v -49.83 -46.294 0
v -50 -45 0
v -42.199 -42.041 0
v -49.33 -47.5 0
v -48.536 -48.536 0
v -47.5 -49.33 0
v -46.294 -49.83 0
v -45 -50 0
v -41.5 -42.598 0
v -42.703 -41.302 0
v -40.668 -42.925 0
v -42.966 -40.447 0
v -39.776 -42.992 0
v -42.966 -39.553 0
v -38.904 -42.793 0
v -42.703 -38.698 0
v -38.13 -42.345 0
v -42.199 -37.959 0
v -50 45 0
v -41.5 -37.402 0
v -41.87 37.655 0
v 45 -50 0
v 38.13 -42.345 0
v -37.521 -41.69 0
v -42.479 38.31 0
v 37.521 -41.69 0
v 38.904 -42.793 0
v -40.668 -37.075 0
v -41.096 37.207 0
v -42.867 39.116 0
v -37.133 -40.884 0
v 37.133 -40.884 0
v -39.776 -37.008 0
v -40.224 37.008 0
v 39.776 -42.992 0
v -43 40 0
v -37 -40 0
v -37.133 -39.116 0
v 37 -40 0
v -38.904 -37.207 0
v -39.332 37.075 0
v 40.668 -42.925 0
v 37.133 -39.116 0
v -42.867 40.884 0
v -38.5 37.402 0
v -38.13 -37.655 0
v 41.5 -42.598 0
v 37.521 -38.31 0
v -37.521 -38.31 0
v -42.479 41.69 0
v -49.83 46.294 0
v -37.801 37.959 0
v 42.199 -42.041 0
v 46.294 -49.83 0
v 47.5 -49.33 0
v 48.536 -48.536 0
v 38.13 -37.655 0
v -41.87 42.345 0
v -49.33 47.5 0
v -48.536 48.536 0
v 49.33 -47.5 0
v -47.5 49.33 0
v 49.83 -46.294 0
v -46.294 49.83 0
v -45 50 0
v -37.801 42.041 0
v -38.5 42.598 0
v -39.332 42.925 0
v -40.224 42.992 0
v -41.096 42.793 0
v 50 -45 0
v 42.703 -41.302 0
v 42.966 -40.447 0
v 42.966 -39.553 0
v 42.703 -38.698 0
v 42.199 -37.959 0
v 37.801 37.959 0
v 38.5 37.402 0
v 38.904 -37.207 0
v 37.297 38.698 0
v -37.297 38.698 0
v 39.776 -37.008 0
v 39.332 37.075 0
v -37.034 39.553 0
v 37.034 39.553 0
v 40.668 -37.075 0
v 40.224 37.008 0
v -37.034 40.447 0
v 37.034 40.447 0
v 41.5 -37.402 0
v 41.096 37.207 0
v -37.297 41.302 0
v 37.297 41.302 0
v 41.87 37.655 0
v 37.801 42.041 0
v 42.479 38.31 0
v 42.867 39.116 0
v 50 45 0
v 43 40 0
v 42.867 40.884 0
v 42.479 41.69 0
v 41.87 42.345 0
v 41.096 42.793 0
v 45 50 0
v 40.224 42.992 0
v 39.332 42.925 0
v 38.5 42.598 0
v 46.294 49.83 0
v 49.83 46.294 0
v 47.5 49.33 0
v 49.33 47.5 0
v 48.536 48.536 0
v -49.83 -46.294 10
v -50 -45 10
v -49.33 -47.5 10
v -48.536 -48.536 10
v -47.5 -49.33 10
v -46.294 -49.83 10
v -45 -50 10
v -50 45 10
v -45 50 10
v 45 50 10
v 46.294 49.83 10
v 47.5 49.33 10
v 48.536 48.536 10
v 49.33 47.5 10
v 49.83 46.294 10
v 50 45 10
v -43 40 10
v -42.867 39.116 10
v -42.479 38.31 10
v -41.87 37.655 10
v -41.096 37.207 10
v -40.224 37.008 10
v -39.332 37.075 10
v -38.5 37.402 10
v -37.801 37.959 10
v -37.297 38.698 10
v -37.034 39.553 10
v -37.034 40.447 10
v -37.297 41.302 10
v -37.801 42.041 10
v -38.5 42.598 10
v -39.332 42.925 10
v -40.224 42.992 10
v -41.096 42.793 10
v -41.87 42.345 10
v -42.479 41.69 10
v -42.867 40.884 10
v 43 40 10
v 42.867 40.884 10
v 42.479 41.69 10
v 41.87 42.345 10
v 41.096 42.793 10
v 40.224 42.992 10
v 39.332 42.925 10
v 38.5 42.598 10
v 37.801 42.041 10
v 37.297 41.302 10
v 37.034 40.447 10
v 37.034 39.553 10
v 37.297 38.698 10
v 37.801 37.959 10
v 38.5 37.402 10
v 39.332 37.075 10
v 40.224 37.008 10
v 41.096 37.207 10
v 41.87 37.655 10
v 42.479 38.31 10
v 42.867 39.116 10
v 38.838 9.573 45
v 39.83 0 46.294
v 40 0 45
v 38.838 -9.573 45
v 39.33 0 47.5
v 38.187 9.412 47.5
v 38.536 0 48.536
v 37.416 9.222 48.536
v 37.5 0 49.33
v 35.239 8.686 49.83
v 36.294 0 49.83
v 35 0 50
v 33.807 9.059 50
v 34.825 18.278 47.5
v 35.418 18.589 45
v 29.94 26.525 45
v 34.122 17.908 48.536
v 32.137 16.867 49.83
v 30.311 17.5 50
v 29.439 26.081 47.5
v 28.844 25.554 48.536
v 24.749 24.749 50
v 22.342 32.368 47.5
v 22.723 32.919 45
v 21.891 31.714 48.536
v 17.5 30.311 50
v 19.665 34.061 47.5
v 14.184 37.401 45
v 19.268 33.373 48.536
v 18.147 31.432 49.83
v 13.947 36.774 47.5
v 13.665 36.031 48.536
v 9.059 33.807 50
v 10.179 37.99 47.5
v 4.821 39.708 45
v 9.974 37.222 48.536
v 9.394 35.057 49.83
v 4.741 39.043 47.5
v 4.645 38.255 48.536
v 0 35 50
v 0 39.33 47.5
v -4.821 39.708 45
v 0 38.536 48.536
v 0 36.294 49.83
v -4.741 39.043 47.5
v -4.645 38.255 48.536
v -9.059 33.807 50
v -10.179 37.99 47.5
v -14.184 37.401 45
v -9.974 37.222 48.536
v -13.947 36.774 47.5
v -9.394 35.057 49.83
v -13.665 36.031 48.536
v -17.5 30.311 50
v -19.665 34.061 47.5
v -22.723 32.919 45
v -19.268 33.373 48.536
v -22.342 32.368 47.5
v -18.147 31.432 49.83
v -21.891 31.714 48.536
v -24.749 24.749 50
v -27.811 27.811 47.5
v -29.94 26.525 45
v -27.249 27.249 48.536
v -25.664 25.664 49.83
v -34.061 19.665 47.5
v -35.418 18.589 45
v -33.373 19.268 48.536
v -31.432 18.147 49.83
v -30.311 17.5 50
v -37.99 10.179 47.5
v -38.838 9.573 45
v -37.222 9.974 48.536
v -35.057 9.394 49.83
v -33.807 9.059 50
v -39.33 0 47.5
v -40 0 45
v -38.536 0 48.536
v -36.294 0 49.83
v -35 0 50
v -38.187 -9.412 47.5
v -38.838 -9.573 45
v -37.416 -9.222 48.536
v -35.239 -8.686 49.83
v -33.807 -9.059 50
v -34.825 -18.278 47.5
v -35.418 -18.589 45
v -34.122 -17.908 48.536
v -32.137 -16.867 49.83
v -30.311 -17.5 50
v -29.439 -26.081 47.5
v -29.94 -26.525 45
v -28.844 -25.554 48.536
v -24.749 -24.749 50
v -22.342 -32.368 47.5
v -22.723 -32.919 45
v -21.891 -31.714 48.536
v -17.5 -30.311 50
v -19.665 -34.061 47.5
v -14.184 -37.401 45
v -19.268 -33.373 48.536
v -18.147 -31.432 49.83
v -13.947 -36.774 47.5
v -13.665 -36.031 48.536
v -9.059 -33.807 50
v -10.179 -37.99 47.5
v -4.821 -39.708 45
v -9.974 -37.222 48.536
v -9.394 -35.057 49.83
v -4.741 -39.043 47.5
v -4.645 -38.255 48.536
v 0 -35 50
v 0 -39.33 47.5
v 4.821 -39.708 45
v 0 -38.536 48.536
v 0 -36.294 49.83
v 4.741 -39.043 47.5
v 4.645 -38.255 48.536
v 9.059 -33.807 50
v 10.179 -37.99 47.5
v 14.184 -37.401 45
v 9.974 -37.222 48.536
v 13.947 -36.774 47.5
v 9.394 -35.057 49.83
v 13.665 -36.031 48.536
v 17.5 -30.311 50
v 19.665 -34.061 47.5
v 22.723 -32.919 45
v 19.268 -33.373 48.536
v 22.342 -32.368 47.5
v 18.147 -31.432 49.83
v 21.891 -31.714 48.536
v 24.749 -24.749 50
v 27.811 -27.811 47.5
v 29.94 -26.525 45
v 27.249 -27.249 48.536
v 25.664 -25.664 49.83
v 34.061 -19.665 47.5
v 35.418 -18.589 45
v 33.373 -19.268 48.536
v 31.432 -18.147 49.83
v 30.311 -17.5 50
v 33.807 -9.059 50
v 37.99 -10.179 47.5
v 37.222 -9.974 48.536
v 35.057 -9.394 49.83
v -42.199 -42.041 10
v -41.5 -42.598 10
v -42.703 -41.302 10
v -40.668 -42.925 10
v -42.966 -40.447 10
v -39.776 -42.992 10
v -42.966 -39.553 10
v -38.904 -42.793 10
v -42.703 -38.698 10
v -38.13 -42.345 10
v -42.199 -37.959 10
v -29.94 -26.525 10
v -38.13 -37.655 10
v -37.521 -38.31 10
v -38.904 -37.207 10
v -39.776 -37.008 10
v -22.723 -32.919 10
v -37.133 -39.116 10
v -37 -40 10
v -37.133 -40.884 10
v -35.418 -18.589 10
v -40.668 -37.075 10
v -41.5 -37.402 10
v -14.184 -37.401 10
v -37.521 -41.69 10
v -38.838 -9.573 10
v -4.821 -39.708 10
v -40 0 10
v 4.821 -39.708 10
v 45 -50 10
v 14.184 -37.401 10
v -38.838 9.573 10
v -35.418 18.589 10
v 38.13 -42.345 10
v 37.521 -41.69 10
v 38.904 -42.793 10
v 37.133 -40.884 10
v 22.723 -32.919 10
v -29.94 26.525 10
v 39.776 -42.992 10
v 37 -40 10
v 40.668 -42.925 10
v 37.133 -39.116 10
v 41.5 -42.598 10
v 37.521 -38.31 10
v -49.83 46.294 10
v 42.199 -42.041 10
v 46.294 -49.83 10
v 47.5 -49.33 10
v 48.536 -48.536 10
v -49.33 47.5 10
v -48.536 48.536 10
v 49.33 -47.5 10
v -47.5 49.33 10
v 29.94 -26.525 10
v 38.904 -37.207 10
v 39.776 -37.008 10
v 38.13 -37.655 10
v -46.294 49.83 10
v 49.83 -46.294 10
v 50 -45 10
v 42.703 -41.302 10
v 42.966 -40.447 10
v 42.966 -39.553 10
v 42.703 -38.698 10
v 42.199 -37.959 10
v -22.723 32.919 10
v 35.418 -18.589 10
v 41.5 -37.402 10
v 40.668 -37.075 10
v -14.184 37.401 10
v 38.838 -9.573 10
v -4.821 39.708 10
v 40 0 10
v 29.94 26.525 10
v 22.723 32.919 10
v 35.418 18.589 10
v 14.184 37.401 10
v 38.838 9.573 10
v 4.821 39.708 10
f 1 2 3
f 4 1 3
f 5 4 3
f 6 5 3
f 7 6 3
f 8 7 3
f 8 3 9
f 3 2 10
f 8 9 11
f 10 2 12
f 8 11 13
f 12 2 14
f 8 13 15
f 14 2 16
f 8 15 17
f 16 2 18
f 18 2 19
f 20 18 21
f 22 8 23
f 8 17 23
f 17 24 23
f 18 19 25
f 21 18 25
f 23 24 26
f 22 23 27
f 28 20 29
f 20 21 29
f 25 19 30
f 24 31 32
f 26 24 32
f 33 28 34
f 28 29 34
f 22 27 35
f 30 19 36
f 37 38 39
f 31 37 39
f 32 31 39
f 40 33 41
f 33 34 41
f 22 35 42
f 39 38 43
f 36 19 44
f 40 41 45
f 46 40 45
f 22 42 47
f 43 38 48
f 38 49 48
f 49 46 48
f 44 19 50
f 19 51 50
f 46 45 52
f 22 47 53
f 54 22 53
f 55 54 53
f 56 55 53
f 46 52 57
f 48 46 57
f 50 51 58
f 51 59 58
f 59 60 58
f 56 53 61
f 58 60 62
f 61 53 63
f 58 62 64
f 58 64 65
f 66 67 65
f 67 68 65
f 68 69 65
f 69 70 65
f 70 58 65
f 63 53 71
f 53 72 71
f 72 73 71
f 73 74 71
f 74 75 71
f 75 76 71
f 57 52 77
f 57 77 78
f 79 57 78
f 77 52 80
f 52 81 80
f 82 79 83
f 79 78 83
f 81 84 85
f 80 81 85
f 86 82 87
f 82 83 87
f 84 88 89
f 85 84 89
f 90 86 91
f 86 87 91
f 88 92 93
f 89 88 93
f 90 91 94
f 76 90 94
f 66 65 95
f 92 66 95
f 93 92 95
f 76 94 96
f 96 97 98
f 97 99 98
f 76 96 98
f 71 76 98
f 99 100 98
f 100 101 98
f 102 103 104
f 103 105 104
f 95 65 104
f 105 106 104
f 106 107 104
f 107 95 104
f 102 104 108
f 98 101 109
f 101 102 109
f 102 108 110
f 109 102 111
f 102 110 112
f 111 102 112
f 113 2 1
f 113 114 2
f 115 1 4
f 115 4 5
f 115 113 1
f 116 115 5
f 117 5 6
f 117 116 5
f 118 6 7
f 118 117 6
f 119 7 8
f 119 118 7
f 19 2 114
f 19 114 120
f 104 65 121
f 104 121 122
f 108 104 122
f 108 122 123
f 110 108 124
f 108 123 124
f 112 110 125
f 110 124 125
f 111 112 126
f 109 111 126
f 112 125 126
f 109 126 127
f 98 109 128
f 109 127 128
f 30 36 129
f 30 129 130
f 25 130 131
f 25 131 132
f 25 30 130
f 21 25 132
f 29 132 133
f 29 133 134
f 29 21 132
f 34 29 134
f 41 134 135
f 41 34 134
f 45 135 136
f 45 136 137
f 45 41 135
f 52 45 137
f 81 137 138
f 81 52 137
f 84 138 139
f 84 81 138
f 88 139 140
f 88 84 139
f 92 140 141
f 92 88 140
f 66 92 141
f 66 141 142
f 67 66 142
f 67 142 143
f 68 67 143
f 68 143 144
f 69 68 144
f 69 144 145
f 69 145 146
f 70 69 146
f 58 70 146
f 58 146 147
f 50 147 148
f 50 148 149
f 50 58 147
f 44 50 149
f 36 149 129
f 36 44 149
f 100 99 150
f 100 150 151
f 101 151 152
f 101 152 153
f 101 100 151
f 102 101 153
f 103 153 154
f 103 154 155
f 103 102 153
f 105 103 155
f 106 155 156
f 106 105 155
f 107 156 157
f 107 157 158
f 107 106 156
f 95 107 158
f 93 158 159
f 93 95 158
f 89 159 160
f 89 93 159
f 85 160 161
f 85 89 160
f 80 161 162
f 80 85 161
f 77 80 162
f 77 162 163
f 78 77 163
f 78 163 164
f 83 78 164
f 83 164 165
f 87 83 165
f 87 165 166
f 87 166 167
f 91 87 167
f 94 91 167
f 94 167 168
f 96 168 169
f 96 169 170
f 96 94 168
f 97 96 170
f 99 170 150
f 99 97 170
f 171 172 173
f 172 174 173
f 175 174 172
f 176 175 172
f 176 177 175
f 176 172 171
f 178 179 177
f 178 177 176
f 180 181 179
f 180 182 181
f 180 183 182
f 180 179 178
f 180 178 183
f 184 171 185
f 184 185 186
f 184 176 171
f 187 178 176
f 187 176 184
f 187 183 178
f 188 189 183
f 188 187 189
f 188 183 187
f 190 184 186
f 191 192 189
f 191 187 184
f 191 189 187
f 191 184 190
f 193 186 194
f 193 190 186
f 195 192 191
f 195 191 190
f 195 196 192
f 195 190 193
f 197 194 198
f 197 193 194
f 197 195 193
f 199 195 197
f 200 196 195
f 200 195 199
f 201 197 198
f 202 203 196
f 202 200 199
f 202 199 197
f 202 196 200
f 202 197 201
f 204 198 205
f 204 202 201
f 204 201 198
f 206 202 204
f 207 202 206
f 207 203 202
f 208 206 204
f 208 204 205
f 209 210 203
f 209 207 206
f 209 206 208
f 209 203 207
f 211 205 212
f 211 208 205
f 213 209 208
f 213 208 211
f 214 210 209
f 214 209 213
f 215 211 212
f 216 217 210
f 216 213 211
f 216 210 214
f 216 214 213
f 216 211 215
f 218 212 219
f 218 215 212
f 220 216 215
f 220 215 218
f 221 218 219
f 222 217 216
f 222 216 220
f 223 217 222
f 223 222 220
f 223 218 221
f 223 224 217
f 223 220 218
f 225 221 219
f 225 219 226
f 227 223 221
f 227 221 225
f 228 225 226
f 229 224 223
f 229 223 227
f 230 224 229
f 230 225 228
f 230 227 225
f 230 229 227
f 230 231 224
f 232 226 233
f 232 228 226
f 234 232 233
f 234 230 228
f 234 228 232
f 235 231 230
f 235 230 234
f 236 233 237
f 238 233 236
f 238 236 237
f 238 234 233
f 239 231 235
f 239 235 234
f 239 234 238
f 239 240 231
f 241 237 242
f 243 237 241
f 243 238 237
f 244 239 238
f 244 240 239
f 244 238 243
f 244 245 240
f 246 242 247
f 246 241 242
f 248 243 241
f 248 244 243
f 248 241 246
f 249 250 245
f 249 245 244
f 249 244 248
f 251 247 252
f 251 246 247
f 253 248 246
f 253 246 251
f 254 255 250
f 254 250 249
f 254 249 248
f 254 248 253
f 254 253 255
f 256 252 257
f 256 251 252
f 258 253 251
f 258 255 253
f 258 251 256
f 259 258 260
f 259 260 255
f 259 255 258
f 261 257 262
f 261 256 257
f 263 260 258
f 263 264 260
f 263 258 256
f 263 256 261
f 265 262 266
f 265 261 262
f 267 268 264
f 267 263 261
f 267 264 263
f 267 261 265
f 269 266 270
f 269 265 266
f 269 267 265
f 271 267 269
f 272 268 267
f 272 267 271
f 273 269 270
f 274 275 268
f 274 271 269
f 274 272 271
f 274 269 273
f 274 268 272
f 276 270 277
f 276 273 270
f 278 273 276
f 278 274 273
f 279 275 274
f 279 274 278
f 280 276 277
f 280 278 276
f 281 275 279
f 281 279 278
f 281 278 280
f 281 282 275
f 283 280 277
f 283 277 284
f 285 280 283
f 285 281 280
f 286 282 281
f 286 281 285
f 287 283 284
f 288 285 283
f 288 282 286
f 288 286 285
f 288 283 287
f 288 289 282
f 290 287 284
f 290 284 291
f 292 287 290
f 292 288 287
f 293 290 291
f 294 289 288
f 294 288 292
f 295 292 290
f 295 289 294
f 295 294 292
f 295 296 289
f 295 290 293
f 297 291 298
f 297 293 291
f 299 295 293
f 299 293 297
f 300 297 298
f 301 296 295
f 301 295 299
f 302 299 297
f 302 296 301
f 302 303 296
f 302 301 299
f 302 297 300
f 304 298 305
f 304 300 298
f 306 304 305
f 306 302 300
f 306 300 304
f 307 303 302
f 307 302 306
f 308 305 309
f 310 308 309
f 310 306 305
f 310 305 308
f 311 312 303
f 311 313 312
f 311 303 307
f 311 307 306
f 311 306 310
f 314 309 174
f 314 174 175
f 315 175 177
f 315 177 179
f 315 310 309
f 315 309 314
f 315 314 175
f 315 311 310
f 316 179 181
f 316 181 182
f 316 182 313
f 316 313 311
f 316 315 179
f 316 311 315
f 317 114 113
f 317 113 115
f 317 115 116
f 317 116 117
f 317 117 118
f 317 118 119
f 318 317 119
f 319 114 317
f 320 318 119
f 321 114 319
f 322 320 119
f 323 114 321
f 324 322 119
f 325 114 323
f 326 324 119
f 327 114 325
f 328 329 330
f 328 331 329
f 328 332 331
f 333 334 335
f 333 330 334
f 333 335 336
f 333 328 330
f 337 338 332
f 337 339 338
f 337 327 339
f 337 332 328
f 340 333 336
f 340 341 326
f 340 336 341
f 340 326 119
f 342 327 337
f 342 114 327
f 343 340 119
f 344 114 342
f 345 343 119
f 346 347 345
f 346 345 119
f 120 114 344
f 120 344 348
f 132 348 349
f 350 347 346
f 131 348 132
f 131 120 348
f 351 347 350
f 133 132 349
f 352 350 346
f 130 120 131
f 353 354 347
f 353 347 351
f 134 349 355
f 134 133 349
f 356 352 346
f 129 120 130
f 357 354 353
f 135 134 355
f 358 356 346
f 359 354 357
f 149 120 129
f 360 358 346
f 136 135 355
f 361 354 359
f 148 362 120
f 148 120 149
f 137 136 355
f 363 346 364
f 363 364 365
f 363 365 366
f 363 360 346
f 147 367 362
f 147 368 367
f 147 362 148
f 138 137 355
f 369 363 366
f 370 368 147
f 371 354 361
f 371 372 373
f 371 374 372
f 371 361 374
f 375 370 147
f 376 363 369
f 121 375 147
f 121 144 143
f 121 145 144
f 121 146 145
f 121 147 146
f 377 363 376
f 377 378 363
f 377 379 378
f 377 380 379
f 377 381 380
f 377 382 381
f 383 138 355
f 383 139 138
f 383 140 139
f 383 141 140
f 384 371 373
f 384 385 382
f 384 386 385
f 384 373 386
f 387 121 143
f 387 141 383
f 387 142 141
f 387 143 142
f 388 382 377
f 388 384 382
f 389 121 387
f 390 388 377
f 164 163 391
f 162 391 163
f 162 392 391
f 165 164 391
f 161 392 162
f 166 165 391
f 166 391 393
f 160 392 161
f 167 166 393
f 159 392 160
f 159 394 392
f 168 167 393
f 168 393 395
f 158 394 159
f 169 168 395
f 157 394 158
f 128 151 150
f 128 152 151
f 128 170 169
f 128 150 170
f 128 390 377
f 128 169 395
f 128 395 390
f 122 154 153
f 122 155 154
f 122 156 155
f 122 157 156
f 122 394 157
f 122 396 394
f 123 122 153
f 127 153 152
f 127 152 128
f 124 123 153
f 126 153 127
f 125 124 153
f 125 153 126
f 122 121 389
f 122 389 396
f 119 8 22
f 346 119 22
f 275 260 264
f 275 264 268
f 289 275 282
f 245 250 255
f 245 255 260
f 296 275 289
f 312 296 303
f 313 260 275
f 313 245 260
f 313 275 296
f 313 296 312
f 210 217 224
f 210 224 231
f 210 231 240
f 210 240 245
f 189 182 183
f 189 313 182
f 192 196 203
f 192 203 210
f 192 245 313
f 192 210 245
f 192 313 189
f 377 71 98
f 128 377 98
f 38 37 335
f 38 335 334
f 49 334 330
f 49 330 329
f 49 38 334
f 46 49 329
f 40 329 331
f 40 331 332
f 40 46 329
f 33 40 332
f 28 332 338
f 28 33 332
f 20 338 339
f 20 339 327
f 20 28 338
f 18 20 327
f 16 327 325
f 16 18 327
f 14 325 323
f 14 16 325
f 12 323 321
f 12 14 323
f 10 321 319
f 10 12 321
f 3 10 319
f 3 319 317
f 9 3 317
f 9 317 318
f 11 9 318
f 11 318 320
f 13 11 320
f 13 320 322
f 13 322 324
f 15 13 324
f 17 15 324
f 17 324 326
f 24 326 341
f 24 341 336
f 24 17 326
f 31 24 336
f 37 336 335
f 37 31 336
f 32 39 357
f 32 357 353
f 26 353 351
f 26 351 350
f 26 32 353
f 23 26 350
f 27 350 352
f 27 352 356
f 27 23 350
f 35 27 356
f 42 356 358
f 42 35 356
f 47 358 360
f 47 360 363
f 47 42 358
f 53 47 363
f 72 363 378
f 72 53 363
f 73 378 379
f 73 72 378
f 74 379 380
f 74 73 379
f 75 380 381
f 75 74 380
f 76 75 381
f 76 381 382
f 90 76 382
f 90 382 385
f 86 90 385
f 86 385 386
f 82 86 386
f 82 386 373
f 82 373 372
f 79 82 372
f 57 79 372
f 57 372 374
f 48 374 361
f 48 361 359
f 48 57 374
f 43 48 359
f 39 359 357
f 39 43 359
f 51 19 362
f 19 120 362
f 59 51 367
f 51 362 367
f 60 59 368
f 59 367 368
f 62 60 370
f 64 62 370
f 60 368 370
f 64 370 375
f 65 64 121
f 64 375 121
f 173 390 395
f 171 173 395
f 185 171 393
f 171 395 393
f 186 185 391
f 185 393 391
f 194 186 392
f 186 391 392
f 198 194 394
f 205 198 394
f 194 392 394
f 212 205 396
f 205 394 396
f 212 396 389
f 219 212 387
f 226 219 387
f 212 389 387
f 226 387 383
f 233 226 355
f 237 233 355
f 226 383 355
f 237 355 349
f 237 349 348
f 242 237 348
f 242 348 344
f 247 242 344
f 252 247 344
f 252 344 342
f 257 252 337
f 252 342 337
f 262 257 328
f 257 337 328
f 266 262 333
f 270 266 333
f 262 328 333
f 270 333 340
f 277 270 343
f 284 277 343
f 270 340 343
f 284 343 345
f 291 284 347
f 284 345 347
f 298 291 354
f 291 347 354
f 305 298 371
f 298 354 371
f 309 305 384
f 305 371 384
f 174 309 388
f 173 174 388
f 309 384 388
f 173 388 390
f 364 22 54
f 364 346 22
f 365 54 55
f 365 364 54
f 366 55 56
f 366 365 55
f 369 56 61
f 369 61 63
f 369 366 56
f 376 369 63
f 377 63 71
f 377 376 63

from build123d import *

# Parameters (mm, degrees)
SKETCH1_W           = 100
SKETCH1_H           = 100
SKETCH1_R           = 3
BOSS_EXTRUDE1_DEPTH = 10
SKETCH2_R           = 40
BOSS_EXTRUDE2_DEPTH = 40
FILLET1_R           = 5


with BuildPart() as part:
    # Sketch1 → Boss-Extrude1 (new body)
    with BuildSketch(Plane.XY):
        Rectangle(SKETCH1_W, SKETCH1_H)
        with Locations((40, 40)):
            Circle(SKETCH1_R, mode=Mode.SUBTRACT)
        with Locations(Location((-40, 40, 0), (0, 0, 180))):
            Circle(SKETCH1_R, mode=Mode.SUBTRACT)
        with Locations((-40, -40)):
            Circle(SKETCH1_R, mode=Mode.SUBTRACT)
        with Locations(Location((40, -40, 0), (0, 0, 180))):
            Circle(SKETCH1_R, mode=Mode.SUBTRACT)
    extrude(amount=BOSS_EXTRUDE1_DEPTH)

    # Sketch2 → Boss-Extrude2 (add)
    with BuildSketch(Plane.XY.offset(10)):
        Circle(SKETCH2_R)
    extrude(amount=BOSS_EXTRUDE2_DEPTH)

    # Fillet1
    fillet1_edges = [part.edges().sort_by_distance(p)[0] for p in [
        (-40, 0, 50),
        (50, -50, 5),
        (-50, -50, 5),
        (-50, 50, 5),
        (50, 50, 5),
    ]]
    fillet(fillet1_edges, radius=FILLET1_R)


solid = part.part
